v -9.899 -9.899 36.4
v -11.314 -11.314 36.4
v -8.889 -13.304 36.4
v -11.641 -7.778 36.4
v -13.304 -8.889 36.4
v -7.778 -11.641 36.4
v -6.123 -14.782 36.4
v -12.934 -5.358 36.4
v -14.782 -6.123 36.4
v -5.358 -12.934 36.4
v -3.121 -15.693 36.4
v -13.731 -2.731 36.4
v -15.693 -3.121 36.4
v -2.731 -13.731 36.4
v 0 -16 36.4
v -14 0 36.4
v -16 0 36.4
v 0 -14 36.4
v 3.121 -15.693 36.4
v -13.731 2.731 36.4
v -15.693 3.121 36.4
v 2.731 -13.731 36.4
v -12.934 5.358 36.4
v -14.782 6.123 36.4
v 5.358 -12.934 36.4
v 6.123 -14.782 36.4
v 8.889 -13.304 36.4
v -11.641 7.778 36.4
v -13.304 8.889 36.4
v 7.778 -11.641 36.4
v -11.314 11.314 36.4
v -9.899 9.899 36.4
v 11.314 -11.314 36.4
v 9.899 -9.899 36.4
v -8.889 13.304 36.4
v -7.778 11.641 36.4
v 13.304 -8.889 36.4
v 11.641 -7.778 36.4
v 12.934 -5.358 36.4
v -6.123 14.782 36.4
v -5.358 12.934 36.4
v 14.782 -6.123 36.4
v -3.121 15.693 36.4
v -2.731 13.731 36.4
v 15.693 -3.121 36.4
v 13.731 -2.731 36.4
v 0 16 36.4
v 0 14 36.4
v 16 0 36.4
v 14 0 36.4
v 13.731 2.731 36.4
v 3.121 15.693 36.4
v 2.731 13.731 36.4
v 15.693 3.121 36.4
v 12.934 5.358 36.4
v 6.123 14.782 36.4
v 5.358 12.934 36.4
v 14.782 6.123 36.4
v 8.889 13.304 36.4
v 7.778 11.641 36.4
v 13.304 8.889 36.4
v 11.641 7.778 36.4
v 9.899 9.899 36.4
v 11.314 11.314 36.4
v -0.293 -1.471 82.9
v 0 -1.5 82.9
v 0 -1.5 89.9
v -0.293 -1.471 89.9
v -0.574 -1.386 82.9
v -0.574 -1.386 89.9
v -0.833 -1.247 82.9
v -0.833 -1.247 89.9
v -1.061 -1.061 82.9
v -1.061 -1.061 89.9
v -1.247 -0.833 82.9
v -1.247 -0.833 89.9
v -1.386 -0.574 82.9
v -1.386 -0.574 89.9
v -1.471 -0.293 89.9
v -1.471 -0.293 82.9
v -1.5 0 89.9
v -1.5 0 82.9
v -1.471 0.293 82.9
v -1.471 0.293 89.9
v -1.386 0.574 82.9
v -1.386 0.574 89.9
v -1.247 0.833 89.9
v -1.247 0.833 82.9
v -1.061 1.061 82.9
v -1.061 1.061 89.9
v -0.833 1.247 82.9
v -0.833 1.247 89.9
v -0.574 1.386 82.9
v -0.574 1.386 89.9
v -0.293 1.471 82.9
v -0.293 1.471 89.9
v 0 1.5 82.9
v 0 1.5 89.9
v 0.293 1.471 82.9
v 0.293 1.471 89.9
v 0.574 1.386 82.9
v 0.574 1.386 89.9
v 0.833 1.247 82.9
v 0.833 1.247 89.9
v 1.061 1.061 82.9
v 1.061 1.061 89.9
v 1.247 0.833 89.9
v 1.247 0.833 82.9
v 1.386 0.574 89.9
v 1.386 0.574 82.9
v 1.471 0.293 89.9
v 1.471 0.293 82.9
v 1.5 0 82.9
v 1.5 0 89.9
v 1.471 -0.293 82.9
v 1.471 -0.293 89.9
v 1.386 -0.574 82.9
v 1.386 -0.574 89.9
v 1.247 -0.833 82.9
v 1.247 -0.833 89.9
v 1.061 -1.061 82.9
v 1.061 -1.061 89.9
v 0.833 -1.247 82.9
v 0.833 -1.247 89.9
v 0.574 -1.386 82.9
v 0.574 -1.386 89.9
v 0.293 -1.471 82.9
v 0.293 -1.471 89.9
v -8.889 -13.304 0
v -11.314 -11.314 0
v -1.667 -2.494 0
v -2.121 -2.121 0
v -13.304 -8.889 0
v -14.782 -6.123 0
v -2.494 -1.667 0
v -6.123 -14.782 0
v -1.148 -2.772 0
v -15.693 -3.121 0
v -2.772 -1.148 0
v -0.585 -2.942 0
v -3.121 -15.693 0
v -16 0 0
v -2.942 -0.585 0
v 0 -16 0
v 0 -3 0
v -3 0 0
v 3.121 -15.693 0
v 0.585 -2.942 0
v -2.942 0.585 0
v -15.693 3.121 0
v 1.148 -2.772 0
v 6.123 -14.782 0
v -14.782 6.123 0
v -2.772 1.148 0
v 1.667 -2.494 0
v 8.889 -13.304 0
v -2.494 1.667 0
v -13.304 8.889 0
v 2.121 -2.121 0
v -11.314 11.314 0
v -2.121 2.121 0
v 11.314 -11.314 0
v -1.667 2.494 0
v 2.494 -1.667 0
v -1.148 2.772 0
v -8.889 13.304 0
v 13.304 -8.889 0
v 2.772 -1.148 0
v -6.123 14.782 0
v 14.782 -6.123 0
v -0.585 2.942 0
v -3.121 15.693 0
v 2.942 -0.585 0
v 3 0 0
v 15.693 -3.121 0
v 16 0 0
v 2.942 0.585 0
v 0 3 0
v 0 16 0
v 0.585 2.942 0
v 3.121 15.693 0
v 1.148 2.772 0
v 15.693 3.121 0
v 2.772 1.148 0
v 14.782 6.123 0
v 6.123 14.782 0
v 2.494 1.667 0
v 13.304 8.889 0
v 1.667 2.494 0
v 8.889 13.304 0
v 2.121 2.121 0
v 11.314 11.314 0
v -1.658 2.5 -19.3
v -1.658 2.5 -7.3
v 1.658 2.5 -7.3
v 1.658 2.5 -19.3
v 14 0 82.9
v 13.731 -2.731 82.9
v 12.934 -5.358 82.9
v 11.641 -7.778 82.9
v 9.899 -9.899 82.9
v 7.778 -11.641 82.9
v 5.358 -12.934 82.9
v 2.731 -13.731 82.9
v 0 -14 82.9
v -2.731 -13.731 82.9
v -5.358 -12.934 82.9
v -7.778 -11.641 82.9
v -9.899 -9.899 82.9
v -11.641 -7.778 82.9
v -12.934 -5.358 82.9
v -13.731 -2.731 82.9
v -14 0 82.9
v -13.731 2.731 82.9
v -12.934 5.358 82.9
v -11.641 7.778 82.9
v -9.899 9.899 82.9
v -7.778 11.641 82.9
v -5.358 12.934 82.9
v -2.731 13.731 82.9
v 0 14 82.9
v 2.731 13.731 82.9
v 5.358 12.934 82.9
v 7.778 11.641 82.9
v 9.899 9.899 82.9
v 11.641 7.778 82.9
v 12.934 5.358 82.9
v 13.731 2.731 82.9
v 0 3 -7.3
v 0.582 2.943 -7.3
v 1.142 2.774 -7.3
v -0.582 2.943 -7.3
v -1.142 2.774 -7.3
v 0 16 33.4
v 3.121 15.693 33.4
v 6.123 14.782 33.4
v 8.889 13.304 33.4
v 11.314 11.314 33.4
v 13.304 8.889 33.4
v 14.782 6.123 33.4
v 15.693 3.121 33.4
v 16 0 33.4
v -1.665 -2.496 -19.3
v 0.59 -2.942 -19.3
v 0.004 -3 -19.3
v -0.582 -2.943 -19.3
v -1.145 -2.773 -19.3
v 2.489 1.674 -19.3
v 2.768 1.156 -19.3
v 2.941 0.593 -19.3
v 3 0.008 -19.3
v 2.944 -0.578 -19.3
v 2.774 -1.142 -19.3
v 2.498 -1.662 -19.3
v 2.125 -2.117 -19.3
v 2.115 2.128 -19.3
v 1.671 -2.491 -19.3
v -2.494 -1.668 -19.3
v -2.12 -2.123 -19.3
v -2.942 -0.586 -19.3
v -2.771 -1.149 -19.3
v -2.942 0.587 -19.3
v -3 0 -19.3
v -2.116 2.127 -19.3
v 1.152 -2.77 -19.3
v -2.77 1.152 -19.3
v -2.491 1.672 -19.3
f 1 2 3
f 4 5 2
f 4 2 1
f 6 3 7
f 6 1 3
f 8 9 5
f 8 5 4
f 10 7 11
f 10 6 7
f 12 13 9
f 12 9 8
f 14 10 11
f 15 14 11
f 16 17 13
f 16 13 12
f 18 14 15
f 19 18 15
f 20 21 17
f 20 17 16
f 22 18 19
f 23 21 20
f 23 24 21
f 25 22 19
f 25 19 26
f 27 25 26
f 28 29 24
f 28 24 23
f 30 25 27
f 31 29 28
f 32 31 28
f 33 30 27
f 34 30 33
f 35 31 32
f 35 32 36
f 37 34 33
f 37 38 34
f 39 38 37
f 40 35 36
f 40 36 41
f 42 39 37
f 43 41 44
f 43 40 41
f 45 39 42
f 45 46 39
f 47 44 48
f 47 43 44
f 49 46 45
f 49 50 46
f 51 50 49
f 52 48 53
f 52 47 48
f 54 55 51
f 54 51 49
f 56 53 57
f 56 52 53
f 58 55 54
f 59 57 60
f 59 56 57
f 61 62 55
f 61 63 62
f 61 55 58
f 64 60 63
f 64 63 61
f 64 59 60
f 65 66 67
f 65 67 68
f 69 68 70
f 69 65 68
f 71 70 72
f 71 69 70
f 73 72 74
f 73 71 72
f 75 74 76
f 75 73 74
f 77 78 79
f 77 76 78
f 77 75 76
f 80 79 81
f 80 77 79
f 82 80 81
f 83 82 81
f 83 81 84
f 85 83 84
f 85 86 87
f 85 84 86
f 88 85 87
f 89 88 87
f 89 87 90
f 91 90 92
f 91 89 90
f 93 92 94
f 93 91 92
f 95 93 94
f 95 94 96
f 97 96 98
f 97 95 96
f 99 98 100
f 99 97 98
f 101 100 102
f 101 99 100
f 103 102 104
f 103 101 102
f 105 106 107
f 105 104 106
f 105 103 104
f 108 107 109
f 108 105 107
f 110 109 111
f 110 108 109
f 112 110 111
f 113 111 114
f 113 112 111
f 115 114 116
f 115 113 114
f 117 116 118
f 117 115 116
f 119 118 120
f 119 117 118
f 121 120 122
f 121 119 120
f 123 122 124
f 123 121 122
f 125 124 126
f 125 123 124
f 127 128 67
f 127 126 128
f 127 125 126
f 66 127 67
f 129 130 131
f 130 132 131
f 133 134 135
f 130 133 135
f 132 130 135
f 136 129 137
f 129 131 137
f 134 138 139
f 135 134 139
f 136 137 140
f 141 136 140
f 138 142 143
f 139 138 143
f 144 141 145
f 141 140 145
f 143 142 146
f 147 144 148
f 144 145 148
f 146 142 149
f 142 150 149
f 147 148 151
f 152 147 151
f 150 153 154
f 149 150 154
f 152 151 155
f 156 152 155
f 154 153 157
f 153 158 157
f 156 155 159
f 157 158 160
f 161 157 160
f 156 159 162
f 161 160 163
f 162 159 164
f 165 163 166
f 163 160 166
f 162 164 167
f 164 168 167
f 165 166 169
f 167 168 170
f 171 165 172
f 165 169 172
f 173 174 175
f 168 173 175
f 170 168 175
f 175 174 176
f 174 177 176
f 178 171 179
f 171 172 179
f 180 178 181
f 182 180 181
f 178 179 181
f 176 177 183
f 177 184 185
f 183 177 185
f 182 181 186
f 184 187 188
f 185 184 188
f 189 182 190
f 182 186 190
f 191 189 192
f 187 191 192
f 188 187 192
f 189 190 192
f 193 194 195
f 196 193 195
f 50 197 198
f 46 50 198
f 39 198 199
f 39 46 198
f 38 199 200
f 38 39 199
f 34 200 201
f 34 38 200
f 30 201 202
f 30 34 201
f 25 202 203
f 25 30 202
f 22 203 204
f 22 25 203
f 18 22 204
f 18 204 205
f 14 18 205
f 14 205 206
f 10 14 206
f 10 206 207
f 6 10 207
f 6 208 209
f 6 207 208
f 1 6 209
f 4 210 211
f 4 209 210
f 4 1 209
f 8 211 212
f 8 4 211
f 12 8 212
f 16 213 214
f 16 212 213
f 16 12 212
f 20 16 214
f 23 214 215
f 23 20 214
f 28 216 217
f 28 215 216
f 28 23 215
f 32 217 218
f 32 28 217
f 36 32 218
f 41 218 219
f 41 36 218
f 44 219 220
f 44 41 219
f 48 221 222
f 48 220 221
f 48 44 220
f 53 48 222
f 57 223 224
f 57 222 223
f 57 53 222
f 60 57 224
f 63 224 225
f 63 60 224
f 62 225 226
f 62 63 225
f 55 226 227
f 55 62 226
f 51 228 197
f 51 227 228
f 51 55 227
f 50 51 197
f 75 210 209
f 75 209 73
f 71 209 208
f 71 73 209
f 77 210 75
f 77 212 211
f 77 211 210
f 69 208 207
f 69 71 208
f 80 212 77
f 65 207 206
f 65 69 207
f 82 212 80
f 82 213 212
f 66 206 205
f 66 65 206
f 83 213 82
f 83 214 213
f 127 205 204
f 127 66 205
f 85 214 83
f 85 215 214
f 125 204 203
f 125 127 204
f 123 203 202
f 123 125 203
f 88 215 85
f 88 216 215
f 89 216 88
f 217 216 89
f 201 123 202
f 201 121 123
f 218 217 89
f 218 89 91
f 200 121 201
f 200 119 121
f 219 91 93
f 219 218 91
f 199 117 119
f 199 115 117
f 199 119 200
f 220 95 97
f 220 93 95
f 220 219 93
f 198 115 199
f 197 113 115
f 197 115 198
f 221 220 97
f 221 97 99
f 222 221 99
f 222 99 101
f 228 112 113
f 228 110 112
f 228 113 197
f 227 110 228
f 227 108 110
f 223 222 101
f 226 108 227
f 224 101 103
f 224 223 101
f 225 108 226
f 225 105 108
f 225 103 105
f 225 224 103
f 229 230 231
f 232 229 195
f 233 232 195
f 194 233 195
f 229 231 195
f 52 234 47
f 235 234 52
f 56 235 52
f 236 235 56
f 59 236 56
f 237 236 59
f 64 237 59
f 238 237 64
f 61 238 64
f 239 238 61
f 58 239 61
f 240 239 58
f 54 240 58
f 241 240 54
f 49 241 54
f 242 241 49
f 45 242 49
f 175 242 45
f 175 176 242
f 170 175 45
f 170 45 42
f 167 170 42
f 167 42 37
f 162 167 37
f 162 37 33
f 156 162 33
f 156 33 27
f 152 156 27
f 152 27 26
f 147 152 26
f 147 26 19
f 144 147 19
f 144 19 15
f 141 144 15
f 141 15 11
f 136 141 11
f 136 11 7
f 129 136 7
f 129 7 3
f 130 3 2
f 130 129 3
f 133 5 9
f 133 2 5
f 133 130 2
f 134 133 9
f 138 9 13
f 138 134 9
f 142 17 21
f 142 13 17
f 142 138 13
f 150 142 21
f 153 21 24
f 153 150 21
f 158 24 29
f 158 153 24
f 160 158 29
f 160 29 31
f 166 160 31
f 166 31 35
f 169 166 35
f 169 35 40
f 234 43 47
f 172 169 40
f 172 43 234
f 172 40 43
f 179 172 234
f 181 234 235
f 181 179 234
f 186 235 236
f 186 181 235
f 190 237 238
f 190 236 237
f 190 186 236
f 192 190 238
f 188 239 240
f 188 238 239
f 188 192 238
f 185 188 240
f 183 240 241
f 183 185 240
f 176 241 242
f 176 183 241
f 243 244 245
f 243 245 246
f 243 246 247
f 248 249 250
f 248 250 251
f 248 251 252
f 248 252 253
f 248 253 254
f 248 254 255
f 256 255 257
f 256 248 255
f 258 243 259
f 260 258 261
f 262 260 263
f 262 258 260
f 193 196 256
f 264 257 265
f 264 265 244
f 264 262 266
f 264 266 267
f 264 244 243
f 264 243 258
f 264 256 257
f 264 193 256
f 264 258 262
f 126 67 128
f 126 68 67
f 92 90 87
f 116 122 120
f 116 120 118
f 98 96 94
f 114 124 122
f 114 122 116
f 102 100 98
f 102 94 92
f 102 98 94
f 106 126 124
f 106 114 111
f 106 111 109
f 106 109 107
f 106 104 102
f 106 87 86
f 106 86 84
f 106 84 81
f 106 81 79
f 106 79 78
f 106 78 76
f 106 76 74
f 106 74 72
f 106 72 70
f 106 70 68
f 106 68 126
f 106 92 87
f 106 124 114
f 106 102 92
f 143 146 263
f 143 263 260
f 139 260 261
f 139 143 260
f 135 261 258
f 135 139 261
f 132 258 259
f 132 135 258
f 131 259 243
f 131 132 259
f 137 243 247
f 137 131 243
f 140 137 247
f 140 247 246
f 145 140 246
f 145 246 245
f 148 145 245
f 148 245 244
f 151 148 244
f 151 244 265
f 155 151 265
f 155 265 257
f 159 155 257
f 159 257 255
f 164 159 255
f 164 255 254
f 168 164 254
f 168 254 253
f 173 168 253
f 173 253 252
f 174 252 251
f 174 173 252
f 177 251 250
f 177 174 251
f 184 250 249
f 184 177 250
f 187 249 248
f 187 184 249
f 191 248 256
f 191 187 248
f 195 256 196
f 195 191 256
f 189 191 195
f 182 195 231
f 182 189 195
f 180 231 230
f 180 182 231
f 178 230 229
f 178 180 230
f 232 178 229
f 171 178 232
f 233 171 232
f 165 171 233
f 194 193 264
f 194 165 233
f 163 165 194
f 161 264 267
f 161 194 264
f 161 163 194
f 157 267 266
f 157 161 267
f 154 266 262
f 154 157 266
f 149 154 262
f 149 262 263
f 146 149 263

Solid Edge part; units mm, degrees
sketch "Sketch1" plane through (0, 0, 0) normal (0, 0, 1) x (1, 0, 0)
  circle A0 centre (0, 0) radius 16
extrude "Protrusion1" add sketch "Sketch1" along normal blind 33.4
sketch "Sketch2" plane through (0, 0, 33.4) normal (0, 0, 1) x (0, 1, 0)
  circle A0 centre (0, 0) radius 16
extrude "ExtrudedProtrusion_2" add sketch "Sketch2" along normal blind 3
sketch "Sketch3" plane through (0, 0, 36.4) normal (0, 0, 1) x (1, 0, 0)
  circle A0 centre (0, 0) radius 14
  dimension "D1" = 28
extrude "ExtrudedProtrusion_3" add sketch "Sketch3" along normal blind 46.5
sketch "Sketch4" plane through (0, 0, 82.9) normal (0, 0, 1) x (0, -1, 0)
  circle A0 centre (0, 0) radius 1.5
  dimension "D1" = 3
extrude "ExtrudedProtrusion_4" add sketch "Sketch4" along normal blind 7
sketch "Sketch5" plane through (0, 0, 0) normal (0, 0, -1) x (-1, 0, 0)
  circle A0 centre (0, 0) radius 3
extrude "ExtrudedProtrusion_5" add sketch "Sketch5" along normal blind 19.3
sketch "Sketch6" plane through (0, 0, -19.3) normal (0, 0, -1) x (-1, 0, 0)
  line L0 (1.6583, 2.5) -> (-1.6583, 2.5)
  arc A0 (-1.6583, 2.5) -> (1.6583, 2.5) centre (0, 0) cw
extrude "ExtrudedCutout_1" cut sketch "Sketch6" against normal blind 12
